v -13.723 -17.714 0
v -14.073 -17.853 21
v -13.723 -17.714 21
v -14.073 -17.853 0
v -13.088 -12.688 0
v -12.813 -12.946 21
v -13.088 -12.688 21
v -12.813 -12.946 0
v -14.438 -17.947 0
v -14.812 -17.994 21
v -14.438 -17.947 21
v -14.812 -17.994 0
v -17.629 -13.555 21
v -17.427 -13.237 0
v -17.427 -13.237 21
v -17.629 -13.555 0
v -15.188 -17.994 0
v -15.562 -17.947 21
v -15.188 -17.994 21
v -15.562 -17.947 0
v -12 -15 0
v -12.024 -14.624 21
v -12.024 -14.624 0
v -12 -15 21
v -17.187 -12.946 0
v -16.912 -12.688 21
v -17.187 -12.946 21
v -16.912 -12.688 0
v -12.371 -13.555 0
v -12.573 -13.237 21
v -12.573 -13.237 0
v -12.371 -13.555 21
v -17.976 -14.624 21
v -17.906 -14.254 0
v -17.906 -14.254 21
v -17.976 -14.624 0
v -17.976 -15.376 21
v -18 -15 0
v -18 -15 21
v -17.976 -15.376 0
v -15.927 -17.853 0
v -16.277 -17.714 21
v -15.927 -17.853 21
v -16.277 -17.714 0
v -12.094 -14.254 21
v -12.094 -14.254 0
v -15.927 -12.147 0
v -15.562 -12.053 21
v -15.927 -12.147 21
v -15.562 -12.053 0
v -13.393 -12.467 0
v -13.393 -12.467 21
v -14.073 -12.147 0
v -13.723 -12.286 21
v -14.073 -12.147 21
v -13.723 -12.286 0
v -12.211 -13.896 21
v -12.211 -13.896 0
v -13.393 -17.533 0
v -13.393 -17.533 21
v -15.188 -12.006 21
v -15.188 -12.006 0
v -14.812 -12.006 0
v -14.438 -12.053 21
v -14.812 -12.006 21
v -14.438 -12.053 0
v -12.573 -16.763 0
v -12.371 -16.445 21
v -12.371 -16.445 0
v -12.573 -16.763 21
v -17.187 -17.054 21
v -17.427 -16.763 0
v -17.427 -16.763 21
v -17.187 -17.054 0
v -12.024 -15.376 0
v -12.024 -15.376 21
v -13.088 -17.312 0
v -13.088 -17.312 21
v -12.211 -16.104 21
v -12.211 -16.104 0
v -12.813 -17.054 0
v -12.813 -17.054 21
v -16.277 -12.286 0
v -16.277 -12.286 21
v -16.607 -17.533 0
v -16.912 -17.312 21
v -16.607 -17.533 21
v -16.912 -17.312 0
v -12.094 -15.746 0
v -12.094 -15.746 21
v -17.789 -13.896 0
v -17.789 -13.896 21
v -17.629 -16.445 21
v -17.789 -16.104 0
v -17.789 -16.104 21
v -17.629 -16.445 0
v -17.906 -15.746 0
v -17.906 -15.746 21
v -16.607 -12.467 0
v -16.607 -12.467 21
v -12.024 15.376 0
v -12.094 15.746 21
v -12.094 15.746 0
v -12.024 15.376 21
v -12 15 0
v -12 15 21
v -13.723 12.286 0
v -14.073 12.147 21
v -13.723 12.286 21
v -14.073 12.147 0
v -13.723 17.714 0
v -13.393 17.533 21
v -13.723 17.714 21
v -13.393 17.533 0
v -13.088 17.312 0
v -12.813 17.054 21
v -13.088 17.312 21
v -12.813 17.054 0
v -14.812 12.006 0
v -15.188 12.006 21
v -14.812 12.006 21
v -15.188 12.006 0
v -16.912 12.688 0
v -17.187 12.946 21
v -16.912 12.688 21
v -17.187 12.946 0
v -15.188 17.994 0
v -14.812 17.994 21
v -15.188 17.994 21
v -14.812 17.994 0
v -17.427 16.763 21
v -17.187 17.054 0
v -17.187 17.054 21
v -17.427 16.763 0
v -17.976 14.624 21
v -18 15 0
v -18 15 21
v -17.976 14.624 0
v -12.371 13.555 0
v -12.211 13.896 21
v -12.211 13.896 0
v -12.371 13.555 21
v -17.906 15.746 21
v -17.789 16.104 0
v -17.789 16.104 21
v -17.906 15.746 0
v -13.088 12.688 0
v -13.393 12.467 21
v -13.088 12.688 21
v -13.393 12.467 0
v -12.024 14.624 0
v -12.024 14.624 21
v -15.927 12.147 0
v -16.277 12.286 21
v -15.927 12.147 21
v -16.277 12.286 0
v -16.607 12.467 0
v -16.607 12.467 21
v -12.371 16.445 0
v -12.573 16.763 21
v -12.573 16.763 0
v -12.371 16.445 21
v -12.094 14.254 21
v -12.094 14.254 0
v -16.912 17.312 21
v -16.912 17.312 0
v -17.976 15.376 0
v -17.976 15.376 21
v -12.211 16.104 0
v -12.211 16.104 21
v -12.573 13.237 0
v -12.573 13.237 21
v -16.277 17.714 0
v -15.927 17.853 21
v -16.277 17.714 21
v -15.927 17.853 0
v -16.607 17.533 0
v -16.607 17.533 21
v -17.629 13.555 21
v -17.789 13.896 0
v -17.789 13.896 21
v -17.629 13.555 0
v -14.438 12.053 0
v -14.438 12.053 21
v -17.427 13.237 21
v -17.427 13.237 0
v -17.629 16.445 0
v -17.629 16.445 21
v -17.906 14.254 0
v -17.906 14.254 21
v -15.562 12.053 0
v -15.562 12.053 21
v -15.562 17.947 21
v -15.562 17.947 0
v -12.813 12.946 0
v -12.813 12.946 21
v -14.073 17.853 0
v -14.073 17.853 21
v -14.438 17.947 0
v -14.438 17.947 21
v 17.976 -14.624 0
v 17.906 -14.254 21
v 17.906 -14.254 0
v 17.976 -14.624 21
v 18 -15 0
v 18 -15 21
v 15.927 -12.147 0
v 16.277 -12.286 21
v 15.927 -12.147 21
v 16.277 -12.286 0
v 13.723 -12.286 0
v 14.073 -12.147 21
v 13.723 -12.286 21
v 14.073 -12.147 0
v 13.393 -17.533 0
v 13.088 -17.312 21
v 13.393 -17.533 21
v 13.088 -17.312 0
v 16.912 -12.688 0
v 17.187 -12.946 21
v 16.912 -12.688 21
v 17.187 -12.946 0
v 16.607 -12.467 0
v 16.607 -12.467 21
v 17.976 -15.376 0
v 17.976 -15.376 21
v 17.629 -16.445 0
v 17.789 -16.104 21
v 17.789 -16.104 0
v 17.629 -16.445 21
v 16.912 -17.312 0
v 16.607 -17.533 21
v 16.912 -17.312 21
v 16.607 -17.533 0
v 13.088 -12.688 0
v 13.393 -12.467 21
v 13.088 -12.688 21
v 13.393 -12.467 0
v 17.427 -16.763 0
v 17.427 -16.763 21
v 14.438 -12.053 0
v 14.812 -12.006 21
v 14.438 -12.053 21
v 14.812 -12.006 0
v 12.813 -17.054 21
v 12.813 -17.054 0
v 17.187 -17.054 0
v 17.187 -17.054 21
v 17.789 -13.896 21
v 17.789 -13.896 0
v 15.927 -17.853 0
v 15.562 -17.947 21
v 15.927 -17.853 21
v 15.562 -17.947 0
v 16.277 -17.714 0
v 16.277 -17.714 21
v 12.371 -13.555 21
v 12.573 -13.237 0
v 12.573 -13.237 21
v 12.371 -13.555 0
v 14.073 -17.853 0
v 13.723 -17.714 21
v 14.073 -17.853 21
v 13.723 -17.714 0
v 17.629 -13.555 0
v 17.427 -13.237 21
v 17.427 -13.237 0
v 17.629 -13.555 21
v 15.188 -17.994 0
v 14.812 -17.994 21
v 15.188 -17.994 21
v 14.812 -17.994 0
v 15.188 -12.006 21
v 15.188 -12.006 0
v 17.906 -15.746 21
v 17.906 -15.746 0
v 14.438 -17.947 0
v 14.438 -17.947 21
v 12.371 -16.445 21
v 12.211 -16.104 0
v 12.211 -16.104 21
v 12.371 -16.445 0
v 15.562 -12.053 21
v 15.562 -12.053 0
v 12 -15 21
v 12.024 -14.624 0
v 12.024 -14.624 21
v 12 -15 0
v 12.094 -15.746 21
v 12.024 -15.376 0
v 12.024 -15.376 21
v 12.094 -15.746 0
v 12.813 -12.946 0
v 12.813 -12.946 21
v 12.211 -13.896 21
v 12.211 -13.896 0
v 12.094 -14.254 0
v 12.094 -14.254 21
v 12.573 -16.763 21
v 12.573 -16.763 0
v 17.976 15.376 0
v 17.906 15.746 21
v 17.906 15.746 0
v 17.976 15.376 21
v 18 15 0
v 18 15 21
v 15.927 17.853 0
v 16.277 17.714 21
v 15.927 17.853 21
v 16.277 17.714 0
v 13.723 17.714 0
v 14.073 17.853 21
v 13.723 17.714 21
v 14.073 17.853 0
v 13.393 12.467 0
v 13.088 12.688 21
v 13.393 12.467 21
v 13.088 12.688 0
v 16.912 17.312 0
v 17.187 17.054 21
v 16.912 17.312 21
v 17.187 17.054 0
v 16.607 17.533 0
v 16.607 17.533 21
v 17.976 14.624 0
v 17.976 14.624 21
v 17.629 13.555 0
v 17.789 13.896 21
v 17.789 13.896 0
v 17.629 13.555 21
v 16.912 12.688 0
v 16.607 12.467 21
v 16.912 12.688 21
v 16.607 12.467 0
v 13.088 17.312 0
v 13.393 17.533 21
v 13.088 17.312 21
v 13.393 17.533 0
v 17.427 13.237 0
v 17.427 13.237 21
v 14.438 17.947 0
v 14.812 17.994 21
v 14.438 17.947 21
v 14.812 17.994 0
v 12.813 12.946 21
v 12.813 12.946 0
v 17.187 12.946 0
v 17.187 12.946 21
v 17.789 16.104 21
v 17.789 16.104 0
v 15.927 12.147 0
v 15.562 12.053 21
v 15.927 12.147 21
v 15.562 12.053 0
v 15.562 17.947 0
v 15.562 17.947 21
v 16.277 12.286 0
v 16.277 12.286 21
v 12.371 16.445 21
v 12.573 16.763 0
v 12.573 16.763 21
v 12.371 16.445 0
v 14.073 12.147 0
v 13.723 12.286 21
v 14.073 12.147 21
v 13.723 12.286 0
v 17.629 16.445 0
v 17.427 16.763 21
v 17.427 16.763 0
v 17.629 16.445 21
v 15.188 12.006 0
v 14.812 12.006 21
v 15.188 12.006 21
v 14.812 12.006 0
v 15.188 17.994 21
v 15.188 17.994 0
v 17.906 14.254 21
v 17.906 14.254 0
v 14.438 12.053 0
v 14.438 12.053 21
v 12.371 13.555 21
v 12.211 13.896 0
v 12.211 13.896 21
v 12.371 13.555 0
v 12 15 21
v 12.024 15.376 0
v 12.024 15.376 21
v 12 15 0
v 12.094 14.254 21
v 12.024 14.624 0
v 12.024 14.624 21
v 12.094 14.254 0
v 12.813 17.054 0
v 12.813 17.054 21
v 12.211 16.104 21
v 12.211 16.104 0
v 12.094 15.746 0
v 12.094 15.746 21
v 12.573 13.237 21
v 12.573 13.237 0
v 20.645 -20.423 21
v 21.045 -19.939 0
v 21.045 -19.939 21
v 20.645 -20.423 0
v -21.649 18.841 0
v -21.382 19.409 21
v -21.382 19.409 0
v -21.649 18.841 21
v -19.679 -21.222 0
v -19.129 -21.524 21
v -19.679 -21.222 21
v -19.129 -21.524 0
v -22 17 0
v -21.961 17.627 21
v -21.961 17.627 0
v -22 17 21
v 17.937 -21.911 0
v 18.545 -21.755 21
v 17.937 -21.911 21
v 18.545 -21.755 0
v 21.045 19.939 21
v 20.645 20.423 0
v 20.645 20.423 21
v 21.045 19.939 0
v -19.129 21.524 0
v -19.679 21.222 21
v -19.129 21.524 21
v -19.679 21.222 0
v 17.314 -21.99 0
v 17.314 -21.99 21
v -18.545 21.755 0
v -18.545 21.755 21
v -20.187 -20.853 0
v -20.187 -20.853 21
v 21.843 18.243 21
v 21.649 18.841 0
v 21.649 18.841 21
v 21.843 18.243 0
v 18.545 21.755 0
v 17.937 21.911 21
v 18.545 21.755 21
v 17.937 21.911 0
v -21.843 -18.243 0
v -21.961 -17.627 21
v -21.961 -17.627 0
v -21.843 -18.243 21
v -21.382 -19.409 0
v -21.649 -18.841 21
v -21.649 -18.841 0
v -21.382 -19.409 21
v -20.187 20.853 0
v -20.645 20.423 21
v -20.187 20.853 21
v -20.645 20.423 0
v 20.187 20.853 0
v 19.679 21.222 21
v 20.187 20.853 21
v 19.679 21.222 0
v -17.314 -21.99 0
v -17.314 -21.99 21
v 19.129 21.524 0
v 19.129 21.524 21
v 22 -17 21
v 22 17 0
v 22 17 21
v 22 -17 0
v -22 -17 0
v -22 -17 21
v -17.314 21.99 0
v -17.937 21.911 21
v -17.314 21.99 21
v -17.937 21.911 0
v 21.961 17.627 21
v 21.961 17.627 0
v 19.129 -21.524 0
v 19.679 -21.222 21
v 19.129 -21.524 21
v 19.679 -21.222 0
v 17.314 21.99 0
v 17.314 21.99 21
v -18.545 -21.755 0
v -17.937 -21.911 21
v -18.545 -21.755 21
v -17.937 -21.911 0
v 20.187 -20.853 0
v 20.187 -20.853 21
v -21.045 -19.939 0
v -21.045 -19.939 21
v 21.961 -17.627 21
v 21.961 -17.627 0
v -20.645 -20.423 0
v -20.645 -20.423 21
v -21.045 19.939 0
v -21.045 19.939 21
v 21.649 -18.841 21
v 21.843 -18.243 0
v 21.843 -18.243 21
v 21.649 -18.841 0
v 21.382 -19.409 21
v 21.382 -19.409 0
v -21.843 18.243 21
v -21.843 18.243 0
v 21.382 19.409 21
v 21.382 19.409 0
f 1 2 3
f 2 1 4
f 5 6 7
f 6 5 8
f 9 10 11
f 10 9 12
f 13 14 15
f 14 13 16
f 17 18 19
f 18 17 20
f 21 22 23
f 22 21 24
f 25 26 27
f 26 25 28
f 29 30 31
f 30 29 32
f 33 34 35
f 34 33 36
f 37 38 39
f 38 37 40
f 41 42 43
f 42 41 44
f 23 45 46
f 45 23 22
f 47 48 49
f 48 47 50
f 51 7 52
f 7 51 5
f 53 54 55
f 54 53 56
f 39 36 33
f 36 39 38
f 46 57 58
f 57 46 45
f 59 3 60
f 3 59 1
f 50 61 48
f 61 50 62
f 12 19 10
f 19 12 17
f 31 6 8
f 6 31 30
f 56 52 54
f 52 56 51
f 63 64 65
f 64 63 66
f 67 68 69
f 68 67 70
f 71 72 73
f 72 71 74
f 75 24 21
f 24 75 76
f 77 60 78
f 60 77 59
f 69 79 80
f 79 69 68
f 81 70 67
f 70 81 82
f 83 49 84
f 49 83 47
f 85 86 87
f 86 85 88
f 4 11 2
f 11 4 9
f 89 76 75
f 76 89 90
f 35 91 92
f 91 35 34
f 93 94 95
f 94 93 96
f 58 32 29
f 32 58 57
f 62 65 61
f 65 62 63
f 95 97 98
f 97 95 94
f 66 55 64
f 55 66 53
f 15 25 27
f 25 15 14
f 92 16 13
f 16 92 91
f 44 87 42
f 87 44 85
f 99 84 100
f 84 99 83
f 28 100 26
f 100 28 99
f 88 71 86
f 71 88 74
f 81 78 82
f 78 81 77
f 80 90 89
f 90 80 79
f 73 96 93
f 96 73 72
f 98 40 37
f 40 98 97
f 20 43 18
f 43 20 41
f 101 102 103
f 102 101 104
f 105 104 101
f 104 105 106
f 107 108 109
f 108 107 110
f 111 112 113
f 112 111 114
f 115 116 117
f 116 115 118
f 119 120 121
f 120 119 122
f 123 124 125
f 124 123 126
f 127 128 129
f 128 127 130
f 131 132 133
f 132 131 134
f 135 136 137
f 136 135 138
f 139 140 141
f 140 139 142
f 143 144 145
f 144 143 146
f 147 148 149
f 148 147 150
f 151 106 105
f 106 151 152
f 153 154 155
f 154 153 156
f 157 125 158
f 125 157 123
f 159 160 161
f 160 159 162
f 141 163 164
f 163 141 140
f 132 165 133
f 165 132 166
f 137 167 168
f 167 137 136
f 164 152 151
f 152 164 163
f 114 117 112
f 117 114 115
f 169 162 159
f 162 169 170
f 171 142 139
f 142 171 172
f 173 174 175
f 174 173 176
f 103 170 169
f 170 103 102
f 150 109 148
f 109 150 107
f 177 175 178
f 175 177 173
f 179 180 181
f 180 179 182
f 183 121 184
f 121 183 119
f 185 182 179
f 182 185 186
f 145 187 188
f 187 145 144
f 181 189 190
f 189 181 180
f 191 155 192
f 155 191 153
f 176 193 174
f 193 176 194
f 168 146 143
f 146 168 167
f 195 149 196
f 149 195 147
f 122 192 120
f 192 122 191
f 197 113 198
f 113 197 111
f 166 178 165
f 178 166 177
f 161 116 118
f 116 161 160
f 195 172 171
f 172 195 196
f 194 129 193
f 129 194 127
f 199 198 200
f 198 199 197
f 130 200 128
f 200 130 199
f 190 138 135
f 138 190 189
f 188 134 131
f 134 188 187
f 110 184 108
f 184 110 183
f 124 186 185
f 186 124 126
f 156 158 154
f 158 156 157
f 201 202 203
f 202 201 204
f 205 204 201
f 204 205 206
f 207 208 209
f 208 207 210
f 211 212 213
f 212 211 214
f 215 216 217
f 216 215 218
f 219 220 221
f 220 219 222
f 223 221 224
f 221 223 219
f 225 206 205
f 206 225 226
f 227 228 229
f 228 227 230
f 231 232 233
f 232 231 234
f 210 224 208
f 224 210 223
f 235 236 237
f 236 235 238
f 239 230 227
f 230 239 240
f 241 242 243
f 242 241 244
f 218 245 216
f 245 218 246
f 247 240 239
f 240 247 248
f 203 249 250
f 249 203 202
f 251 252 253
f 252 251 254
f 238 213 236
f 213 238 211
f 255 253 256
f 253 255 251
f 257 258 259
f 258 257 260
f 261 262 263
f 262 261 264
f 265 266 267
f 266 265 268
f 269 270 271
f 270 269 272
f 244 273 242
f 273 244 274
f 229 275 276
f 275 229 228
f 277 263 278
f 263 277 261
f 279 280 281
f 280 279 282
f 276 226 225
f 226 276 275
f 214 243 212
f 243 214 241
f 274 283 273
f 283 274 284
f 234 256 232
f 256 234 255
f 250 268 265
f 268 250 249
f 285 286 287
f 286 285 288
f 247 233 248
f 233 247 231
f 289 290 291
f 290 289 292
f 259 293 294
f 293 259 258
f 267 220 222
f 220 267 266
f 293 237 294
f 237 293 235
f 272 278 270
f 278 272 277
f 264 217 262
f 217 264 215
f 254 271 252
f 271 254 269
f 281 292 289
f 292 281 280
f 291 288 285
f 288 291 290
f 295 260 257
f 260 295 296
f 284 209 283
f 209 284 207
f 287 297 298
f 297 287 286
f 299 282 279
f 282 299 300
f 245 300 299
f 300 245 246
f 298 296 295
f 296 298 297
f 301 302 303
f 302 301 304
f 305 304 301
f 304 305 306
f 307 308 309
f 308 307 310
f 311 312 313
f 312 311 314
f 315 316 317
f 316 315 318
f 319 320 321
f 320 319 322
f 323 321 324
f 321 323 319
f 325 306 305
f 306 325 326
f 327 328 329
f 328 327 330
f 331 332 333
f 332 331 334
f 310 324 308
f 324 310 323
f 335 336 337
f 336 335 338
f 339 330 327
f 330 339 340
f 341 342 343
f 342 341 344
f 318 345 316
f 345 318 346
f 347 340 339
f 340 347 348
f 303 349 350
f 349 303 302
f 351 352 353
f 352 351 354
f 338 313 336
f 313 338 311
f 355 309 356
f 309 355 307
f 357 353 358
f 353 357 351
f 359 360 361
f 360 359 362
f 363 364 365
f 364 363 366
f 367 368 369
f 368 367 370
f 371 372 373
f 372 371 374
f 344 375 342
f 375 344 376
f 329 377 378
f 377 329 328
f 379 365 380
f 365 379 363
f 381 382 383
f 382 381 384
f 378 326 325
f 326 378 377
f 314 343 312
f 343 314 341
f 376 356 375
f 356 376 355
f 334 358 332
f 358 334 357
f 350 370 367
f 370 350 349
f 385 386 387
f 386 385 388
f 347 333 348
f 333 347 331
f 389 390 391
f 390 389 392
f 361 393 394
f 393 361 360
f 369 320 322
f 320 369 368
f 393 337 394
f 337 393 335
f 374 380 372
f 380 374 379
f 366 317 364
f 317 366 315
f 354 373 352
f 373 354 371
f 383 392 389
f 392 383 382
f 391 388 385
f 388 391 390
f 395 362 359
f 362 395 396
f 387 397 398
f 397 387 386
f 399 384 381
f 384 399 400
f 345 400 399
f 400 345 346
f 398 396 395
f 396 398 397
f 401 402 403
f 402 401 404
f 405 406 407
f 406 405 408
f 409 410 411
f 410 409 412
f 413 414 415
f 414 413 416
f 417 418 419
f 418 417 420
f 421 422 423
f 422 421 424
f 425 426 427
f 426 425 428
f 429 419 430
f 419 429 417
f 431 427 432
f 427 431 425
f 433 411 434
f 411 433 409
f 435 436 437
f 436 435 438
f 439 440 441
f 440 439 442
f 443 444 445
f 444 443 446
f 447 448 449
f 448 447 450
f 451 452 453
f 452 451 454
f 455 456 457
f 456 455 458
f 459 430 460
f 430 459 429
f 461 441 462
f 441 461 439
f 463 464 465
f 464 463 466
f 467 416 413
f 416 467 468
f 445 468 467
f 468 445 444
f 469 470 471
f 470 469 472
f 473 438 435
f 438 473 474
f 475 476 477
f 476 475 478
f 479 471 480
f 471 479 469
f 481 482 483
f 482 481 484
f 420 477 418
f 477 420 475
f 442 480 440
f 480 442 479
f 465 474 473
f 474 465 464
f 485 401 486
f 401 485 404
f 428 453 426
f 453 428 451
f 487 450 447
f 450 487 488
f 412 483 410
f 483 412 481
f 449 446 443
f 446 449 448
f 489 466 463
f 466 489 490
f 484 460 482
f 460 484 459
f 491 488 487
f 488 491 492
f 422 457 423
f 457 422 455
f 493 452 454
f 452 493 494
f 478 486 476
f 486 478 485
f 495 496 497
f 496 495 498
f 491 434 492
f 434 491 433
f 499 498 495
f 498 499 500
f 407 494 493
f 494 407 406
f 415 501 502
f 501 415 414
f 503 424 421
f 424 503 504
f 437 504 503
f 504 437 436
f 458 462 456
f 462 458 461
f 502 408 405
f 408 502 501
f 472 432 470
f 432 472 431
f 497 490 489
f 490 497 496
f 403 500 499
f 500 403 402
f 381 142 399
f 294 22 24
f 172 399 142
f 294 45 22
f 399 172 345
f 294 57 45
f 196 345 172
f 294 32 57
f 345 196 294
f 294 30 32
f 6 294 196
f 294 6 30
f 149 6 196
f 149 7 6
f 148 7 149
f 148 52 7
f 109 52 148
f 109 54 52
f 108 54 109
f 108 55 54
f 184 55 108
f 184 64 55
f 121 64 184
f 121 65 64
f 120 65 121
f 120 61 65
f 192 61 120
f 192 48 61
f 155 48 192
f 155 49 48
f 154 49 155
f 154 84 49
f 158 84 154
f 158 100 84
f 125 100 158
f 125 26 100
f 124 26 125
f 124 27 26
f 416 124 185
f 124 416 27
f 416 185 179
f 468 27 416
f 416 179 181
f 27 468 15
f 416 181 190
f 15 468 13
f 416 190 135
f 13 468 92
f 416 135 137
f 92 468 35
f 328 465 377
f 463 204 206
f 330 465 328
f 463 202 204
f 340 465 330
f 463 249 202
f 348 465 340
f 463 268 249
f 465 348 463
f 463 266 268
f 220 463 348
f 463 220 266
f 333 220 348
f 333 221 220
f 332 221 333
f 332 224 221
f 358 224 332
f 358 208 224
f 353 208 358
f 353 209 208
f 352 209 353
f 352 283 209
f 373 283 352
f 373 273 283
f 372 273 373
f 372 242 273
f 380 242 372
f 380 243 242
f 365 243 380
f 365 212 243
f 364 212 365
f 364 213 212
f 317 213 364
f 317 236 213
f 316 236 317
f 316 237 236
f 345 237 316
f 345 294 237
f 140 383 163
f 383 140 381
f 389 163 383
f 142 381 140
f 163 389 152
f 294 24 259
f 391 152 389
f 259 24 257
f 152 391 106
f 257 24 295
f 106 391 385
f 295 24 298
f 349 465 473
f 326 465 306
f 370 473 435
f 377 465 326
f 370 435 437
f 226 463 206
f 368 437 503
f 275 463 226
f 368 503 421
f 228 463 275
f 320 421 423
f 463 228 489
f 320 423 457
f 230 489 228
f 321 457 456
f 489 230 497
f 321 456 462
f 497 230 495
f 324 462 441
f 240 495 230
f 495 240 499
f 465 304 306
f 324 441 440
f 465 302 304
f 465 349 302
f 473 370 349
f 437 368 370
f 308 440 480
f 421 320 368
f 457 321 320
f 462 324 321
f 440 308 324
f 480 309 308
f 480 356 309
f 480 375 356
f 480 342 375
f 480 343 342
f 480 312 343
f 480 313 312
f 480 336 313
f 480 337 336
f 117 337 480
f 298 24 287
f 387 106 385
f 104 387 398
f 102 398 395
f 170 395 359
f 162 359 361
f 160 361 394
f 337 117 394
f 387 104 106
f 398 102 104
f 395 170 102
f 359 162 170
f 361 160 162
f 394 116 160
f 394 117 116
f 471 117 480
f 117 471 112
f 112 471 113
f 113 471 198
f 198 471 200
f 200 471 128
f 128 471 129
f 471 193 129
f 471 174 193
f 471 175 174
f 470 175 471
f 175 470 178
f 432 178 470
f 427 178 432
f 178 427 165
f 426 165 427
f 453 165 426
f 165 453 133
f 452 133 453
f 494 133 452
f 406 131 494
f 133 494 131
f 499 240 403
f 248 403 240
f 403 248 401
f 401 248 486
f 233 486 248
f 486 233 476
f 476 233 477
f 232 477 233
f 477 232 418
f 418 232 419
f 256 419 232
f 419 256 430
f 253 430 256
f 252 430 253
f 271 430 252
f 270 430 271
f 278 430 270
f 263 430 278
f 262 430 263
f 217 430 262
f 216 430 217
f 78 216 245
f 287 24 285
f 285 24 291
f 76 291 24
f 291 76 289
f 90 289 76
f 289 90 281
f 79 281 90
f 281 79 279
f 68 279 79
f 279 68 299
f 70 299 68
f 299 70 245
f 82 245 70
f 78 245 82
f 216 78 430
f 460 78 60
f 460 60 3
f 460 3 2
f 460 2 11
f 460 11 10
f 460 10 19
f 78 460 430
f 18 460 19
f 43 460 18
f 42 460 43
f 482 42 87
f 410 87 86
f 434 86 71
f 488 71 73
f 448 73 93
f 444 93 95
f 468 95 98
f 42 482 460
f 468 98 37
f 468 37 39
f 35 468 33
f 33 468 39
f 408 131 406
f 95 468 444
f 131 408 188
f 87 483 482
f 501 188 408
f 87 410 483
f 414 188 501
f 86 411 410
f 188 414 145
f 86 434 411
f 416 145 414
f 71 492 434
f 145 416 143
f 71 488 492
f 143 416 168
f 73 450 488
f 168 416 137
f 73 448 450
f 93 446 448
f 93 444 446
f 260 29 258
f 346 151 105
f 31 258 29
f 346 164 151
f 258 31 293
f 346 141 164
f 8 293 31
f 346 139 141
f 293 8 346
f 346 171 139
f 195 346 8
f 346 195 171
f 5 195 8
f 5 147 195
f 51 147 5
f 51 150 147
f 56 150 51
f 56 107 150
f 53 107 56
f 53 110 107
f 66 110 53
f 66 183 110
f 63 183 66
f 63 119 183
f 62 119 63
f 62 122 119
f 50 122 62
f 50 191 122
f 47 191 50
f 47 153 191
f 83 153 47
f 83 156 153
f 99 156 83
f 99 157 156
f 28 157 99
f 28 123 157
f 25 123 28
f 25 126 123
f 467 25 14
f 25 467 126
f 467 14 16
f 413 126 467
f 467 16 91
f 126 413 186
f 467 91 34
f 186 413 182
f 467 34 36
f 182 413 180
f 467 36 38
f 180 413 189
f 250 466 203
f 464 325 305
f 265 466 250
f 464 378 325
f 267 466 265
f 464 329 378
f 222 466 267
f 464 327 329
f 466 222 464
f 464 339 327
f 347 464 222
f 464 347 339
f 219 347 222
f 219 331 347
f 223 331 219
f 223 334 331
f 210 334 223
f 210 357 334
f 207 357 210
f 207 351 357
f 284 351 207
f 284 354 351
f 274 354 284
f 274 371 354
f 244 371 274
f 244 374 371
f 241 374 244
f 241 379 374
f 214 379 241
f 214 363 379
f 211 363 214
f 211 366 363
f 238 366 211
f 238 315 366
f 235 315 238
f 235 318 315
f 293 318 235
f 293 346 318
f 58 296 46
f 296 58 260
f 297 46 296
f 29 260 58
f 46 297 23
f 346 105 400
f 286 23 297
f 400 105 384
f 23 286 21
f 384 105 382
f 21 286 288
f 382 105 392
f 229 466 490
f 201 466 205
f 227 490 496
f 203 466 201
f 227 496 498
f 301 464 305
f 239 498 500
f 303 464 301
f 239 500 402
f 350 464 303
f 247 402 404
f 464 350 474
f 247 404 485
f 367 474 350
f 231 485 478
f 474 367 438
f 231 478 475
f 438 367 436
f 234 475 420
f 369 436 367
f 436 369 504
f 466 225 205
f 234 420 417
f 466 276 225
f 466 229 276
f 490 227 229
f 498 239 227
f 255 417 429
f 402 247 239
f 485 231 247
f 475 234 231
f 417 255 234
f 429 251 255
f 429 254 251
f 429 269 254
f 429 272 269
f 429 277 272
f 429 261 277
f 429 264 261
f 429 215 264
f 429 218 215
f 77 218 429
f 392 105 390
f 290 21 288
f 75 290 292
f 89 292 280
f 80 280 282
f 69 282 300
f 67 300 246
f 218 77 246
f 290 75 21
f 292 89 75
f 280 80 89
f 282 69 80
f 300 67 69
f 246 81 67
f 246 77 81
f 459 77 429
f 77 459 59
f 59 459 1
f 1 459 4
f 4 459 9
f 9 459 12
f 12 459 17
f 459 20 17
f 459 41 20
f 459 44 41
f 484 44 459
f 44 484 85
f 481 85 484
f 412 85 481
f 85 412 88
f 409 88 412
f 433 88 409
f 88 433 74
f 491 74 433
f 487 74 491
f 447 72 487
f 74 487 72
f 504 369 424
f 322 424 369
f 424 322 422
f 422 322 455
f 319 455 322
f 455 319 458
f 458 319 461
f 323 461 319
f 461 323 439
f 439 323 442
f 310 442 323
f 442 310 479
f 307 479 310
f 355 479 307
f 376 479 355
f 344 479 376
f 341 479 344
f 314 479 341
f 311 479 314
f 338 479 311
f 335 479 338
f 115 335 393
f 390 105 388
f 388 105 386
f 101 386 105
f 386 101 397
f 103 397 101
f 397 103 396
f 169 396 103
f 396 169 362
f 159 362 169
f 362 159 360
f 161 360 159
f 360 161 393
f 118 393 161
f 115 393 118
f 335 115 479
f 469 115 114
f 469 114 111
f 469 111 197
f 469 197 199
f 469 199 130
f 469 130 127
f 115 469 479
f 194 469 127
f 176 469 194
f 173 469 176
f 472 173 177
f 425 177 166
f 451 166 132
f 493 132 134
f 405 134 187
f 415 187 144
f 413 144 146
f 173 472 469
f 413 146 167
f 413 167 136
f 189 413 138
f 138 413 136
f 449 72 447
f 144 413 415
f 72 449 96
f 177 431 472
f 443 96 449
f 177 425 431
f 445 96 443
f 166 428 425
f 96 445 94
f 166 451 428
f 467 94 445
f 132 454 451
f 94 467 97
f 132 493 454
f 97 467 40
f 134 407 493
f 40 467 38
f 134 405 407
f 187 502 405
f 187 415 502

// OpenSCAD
$fn = 50;


difference() {
	union() {
		hull() {
			translate(v = [-17.0000000000, 17.0000000000, 0]) {
				cylinder(h = 21, r = 5);
			}
			translate(v = [17.0000000000, 17.0000000000, 0]) {
				cylinder(h = 21, r = 5);
			}
			translate(v = [-17.0000000000, -17.0000000000, 0]) {
				cylinder(h = 21, r = 5);
			}
			translate(v = [17.0000000000, -17.0000000000, 0]) {
				cylinder(h = 21, r = 5);
			}
		}
	}
	union() {
		translate(v = [-15.0000000000, -15.0000000000, -100.0000000000]) {
			cylinder(h = 200, r = 3.0000000000);
		}
		translate(v = [-15.0000000000, 15.0000000000, -100.0000000000]) {
			cylinder(h = 200, r = 3.0000000000);
		}
		translate(v = [15.0000000000, -15.0000000000, -100.0000000000]) {
			cylinder(h = 200, r = 3.0000000000);
		}
		translate(v = [15.0000000000, 15.0000000000, -100.0000000000]) {
			cylinder(h = 200, r = 3.0000000000);
		}
	}
}
